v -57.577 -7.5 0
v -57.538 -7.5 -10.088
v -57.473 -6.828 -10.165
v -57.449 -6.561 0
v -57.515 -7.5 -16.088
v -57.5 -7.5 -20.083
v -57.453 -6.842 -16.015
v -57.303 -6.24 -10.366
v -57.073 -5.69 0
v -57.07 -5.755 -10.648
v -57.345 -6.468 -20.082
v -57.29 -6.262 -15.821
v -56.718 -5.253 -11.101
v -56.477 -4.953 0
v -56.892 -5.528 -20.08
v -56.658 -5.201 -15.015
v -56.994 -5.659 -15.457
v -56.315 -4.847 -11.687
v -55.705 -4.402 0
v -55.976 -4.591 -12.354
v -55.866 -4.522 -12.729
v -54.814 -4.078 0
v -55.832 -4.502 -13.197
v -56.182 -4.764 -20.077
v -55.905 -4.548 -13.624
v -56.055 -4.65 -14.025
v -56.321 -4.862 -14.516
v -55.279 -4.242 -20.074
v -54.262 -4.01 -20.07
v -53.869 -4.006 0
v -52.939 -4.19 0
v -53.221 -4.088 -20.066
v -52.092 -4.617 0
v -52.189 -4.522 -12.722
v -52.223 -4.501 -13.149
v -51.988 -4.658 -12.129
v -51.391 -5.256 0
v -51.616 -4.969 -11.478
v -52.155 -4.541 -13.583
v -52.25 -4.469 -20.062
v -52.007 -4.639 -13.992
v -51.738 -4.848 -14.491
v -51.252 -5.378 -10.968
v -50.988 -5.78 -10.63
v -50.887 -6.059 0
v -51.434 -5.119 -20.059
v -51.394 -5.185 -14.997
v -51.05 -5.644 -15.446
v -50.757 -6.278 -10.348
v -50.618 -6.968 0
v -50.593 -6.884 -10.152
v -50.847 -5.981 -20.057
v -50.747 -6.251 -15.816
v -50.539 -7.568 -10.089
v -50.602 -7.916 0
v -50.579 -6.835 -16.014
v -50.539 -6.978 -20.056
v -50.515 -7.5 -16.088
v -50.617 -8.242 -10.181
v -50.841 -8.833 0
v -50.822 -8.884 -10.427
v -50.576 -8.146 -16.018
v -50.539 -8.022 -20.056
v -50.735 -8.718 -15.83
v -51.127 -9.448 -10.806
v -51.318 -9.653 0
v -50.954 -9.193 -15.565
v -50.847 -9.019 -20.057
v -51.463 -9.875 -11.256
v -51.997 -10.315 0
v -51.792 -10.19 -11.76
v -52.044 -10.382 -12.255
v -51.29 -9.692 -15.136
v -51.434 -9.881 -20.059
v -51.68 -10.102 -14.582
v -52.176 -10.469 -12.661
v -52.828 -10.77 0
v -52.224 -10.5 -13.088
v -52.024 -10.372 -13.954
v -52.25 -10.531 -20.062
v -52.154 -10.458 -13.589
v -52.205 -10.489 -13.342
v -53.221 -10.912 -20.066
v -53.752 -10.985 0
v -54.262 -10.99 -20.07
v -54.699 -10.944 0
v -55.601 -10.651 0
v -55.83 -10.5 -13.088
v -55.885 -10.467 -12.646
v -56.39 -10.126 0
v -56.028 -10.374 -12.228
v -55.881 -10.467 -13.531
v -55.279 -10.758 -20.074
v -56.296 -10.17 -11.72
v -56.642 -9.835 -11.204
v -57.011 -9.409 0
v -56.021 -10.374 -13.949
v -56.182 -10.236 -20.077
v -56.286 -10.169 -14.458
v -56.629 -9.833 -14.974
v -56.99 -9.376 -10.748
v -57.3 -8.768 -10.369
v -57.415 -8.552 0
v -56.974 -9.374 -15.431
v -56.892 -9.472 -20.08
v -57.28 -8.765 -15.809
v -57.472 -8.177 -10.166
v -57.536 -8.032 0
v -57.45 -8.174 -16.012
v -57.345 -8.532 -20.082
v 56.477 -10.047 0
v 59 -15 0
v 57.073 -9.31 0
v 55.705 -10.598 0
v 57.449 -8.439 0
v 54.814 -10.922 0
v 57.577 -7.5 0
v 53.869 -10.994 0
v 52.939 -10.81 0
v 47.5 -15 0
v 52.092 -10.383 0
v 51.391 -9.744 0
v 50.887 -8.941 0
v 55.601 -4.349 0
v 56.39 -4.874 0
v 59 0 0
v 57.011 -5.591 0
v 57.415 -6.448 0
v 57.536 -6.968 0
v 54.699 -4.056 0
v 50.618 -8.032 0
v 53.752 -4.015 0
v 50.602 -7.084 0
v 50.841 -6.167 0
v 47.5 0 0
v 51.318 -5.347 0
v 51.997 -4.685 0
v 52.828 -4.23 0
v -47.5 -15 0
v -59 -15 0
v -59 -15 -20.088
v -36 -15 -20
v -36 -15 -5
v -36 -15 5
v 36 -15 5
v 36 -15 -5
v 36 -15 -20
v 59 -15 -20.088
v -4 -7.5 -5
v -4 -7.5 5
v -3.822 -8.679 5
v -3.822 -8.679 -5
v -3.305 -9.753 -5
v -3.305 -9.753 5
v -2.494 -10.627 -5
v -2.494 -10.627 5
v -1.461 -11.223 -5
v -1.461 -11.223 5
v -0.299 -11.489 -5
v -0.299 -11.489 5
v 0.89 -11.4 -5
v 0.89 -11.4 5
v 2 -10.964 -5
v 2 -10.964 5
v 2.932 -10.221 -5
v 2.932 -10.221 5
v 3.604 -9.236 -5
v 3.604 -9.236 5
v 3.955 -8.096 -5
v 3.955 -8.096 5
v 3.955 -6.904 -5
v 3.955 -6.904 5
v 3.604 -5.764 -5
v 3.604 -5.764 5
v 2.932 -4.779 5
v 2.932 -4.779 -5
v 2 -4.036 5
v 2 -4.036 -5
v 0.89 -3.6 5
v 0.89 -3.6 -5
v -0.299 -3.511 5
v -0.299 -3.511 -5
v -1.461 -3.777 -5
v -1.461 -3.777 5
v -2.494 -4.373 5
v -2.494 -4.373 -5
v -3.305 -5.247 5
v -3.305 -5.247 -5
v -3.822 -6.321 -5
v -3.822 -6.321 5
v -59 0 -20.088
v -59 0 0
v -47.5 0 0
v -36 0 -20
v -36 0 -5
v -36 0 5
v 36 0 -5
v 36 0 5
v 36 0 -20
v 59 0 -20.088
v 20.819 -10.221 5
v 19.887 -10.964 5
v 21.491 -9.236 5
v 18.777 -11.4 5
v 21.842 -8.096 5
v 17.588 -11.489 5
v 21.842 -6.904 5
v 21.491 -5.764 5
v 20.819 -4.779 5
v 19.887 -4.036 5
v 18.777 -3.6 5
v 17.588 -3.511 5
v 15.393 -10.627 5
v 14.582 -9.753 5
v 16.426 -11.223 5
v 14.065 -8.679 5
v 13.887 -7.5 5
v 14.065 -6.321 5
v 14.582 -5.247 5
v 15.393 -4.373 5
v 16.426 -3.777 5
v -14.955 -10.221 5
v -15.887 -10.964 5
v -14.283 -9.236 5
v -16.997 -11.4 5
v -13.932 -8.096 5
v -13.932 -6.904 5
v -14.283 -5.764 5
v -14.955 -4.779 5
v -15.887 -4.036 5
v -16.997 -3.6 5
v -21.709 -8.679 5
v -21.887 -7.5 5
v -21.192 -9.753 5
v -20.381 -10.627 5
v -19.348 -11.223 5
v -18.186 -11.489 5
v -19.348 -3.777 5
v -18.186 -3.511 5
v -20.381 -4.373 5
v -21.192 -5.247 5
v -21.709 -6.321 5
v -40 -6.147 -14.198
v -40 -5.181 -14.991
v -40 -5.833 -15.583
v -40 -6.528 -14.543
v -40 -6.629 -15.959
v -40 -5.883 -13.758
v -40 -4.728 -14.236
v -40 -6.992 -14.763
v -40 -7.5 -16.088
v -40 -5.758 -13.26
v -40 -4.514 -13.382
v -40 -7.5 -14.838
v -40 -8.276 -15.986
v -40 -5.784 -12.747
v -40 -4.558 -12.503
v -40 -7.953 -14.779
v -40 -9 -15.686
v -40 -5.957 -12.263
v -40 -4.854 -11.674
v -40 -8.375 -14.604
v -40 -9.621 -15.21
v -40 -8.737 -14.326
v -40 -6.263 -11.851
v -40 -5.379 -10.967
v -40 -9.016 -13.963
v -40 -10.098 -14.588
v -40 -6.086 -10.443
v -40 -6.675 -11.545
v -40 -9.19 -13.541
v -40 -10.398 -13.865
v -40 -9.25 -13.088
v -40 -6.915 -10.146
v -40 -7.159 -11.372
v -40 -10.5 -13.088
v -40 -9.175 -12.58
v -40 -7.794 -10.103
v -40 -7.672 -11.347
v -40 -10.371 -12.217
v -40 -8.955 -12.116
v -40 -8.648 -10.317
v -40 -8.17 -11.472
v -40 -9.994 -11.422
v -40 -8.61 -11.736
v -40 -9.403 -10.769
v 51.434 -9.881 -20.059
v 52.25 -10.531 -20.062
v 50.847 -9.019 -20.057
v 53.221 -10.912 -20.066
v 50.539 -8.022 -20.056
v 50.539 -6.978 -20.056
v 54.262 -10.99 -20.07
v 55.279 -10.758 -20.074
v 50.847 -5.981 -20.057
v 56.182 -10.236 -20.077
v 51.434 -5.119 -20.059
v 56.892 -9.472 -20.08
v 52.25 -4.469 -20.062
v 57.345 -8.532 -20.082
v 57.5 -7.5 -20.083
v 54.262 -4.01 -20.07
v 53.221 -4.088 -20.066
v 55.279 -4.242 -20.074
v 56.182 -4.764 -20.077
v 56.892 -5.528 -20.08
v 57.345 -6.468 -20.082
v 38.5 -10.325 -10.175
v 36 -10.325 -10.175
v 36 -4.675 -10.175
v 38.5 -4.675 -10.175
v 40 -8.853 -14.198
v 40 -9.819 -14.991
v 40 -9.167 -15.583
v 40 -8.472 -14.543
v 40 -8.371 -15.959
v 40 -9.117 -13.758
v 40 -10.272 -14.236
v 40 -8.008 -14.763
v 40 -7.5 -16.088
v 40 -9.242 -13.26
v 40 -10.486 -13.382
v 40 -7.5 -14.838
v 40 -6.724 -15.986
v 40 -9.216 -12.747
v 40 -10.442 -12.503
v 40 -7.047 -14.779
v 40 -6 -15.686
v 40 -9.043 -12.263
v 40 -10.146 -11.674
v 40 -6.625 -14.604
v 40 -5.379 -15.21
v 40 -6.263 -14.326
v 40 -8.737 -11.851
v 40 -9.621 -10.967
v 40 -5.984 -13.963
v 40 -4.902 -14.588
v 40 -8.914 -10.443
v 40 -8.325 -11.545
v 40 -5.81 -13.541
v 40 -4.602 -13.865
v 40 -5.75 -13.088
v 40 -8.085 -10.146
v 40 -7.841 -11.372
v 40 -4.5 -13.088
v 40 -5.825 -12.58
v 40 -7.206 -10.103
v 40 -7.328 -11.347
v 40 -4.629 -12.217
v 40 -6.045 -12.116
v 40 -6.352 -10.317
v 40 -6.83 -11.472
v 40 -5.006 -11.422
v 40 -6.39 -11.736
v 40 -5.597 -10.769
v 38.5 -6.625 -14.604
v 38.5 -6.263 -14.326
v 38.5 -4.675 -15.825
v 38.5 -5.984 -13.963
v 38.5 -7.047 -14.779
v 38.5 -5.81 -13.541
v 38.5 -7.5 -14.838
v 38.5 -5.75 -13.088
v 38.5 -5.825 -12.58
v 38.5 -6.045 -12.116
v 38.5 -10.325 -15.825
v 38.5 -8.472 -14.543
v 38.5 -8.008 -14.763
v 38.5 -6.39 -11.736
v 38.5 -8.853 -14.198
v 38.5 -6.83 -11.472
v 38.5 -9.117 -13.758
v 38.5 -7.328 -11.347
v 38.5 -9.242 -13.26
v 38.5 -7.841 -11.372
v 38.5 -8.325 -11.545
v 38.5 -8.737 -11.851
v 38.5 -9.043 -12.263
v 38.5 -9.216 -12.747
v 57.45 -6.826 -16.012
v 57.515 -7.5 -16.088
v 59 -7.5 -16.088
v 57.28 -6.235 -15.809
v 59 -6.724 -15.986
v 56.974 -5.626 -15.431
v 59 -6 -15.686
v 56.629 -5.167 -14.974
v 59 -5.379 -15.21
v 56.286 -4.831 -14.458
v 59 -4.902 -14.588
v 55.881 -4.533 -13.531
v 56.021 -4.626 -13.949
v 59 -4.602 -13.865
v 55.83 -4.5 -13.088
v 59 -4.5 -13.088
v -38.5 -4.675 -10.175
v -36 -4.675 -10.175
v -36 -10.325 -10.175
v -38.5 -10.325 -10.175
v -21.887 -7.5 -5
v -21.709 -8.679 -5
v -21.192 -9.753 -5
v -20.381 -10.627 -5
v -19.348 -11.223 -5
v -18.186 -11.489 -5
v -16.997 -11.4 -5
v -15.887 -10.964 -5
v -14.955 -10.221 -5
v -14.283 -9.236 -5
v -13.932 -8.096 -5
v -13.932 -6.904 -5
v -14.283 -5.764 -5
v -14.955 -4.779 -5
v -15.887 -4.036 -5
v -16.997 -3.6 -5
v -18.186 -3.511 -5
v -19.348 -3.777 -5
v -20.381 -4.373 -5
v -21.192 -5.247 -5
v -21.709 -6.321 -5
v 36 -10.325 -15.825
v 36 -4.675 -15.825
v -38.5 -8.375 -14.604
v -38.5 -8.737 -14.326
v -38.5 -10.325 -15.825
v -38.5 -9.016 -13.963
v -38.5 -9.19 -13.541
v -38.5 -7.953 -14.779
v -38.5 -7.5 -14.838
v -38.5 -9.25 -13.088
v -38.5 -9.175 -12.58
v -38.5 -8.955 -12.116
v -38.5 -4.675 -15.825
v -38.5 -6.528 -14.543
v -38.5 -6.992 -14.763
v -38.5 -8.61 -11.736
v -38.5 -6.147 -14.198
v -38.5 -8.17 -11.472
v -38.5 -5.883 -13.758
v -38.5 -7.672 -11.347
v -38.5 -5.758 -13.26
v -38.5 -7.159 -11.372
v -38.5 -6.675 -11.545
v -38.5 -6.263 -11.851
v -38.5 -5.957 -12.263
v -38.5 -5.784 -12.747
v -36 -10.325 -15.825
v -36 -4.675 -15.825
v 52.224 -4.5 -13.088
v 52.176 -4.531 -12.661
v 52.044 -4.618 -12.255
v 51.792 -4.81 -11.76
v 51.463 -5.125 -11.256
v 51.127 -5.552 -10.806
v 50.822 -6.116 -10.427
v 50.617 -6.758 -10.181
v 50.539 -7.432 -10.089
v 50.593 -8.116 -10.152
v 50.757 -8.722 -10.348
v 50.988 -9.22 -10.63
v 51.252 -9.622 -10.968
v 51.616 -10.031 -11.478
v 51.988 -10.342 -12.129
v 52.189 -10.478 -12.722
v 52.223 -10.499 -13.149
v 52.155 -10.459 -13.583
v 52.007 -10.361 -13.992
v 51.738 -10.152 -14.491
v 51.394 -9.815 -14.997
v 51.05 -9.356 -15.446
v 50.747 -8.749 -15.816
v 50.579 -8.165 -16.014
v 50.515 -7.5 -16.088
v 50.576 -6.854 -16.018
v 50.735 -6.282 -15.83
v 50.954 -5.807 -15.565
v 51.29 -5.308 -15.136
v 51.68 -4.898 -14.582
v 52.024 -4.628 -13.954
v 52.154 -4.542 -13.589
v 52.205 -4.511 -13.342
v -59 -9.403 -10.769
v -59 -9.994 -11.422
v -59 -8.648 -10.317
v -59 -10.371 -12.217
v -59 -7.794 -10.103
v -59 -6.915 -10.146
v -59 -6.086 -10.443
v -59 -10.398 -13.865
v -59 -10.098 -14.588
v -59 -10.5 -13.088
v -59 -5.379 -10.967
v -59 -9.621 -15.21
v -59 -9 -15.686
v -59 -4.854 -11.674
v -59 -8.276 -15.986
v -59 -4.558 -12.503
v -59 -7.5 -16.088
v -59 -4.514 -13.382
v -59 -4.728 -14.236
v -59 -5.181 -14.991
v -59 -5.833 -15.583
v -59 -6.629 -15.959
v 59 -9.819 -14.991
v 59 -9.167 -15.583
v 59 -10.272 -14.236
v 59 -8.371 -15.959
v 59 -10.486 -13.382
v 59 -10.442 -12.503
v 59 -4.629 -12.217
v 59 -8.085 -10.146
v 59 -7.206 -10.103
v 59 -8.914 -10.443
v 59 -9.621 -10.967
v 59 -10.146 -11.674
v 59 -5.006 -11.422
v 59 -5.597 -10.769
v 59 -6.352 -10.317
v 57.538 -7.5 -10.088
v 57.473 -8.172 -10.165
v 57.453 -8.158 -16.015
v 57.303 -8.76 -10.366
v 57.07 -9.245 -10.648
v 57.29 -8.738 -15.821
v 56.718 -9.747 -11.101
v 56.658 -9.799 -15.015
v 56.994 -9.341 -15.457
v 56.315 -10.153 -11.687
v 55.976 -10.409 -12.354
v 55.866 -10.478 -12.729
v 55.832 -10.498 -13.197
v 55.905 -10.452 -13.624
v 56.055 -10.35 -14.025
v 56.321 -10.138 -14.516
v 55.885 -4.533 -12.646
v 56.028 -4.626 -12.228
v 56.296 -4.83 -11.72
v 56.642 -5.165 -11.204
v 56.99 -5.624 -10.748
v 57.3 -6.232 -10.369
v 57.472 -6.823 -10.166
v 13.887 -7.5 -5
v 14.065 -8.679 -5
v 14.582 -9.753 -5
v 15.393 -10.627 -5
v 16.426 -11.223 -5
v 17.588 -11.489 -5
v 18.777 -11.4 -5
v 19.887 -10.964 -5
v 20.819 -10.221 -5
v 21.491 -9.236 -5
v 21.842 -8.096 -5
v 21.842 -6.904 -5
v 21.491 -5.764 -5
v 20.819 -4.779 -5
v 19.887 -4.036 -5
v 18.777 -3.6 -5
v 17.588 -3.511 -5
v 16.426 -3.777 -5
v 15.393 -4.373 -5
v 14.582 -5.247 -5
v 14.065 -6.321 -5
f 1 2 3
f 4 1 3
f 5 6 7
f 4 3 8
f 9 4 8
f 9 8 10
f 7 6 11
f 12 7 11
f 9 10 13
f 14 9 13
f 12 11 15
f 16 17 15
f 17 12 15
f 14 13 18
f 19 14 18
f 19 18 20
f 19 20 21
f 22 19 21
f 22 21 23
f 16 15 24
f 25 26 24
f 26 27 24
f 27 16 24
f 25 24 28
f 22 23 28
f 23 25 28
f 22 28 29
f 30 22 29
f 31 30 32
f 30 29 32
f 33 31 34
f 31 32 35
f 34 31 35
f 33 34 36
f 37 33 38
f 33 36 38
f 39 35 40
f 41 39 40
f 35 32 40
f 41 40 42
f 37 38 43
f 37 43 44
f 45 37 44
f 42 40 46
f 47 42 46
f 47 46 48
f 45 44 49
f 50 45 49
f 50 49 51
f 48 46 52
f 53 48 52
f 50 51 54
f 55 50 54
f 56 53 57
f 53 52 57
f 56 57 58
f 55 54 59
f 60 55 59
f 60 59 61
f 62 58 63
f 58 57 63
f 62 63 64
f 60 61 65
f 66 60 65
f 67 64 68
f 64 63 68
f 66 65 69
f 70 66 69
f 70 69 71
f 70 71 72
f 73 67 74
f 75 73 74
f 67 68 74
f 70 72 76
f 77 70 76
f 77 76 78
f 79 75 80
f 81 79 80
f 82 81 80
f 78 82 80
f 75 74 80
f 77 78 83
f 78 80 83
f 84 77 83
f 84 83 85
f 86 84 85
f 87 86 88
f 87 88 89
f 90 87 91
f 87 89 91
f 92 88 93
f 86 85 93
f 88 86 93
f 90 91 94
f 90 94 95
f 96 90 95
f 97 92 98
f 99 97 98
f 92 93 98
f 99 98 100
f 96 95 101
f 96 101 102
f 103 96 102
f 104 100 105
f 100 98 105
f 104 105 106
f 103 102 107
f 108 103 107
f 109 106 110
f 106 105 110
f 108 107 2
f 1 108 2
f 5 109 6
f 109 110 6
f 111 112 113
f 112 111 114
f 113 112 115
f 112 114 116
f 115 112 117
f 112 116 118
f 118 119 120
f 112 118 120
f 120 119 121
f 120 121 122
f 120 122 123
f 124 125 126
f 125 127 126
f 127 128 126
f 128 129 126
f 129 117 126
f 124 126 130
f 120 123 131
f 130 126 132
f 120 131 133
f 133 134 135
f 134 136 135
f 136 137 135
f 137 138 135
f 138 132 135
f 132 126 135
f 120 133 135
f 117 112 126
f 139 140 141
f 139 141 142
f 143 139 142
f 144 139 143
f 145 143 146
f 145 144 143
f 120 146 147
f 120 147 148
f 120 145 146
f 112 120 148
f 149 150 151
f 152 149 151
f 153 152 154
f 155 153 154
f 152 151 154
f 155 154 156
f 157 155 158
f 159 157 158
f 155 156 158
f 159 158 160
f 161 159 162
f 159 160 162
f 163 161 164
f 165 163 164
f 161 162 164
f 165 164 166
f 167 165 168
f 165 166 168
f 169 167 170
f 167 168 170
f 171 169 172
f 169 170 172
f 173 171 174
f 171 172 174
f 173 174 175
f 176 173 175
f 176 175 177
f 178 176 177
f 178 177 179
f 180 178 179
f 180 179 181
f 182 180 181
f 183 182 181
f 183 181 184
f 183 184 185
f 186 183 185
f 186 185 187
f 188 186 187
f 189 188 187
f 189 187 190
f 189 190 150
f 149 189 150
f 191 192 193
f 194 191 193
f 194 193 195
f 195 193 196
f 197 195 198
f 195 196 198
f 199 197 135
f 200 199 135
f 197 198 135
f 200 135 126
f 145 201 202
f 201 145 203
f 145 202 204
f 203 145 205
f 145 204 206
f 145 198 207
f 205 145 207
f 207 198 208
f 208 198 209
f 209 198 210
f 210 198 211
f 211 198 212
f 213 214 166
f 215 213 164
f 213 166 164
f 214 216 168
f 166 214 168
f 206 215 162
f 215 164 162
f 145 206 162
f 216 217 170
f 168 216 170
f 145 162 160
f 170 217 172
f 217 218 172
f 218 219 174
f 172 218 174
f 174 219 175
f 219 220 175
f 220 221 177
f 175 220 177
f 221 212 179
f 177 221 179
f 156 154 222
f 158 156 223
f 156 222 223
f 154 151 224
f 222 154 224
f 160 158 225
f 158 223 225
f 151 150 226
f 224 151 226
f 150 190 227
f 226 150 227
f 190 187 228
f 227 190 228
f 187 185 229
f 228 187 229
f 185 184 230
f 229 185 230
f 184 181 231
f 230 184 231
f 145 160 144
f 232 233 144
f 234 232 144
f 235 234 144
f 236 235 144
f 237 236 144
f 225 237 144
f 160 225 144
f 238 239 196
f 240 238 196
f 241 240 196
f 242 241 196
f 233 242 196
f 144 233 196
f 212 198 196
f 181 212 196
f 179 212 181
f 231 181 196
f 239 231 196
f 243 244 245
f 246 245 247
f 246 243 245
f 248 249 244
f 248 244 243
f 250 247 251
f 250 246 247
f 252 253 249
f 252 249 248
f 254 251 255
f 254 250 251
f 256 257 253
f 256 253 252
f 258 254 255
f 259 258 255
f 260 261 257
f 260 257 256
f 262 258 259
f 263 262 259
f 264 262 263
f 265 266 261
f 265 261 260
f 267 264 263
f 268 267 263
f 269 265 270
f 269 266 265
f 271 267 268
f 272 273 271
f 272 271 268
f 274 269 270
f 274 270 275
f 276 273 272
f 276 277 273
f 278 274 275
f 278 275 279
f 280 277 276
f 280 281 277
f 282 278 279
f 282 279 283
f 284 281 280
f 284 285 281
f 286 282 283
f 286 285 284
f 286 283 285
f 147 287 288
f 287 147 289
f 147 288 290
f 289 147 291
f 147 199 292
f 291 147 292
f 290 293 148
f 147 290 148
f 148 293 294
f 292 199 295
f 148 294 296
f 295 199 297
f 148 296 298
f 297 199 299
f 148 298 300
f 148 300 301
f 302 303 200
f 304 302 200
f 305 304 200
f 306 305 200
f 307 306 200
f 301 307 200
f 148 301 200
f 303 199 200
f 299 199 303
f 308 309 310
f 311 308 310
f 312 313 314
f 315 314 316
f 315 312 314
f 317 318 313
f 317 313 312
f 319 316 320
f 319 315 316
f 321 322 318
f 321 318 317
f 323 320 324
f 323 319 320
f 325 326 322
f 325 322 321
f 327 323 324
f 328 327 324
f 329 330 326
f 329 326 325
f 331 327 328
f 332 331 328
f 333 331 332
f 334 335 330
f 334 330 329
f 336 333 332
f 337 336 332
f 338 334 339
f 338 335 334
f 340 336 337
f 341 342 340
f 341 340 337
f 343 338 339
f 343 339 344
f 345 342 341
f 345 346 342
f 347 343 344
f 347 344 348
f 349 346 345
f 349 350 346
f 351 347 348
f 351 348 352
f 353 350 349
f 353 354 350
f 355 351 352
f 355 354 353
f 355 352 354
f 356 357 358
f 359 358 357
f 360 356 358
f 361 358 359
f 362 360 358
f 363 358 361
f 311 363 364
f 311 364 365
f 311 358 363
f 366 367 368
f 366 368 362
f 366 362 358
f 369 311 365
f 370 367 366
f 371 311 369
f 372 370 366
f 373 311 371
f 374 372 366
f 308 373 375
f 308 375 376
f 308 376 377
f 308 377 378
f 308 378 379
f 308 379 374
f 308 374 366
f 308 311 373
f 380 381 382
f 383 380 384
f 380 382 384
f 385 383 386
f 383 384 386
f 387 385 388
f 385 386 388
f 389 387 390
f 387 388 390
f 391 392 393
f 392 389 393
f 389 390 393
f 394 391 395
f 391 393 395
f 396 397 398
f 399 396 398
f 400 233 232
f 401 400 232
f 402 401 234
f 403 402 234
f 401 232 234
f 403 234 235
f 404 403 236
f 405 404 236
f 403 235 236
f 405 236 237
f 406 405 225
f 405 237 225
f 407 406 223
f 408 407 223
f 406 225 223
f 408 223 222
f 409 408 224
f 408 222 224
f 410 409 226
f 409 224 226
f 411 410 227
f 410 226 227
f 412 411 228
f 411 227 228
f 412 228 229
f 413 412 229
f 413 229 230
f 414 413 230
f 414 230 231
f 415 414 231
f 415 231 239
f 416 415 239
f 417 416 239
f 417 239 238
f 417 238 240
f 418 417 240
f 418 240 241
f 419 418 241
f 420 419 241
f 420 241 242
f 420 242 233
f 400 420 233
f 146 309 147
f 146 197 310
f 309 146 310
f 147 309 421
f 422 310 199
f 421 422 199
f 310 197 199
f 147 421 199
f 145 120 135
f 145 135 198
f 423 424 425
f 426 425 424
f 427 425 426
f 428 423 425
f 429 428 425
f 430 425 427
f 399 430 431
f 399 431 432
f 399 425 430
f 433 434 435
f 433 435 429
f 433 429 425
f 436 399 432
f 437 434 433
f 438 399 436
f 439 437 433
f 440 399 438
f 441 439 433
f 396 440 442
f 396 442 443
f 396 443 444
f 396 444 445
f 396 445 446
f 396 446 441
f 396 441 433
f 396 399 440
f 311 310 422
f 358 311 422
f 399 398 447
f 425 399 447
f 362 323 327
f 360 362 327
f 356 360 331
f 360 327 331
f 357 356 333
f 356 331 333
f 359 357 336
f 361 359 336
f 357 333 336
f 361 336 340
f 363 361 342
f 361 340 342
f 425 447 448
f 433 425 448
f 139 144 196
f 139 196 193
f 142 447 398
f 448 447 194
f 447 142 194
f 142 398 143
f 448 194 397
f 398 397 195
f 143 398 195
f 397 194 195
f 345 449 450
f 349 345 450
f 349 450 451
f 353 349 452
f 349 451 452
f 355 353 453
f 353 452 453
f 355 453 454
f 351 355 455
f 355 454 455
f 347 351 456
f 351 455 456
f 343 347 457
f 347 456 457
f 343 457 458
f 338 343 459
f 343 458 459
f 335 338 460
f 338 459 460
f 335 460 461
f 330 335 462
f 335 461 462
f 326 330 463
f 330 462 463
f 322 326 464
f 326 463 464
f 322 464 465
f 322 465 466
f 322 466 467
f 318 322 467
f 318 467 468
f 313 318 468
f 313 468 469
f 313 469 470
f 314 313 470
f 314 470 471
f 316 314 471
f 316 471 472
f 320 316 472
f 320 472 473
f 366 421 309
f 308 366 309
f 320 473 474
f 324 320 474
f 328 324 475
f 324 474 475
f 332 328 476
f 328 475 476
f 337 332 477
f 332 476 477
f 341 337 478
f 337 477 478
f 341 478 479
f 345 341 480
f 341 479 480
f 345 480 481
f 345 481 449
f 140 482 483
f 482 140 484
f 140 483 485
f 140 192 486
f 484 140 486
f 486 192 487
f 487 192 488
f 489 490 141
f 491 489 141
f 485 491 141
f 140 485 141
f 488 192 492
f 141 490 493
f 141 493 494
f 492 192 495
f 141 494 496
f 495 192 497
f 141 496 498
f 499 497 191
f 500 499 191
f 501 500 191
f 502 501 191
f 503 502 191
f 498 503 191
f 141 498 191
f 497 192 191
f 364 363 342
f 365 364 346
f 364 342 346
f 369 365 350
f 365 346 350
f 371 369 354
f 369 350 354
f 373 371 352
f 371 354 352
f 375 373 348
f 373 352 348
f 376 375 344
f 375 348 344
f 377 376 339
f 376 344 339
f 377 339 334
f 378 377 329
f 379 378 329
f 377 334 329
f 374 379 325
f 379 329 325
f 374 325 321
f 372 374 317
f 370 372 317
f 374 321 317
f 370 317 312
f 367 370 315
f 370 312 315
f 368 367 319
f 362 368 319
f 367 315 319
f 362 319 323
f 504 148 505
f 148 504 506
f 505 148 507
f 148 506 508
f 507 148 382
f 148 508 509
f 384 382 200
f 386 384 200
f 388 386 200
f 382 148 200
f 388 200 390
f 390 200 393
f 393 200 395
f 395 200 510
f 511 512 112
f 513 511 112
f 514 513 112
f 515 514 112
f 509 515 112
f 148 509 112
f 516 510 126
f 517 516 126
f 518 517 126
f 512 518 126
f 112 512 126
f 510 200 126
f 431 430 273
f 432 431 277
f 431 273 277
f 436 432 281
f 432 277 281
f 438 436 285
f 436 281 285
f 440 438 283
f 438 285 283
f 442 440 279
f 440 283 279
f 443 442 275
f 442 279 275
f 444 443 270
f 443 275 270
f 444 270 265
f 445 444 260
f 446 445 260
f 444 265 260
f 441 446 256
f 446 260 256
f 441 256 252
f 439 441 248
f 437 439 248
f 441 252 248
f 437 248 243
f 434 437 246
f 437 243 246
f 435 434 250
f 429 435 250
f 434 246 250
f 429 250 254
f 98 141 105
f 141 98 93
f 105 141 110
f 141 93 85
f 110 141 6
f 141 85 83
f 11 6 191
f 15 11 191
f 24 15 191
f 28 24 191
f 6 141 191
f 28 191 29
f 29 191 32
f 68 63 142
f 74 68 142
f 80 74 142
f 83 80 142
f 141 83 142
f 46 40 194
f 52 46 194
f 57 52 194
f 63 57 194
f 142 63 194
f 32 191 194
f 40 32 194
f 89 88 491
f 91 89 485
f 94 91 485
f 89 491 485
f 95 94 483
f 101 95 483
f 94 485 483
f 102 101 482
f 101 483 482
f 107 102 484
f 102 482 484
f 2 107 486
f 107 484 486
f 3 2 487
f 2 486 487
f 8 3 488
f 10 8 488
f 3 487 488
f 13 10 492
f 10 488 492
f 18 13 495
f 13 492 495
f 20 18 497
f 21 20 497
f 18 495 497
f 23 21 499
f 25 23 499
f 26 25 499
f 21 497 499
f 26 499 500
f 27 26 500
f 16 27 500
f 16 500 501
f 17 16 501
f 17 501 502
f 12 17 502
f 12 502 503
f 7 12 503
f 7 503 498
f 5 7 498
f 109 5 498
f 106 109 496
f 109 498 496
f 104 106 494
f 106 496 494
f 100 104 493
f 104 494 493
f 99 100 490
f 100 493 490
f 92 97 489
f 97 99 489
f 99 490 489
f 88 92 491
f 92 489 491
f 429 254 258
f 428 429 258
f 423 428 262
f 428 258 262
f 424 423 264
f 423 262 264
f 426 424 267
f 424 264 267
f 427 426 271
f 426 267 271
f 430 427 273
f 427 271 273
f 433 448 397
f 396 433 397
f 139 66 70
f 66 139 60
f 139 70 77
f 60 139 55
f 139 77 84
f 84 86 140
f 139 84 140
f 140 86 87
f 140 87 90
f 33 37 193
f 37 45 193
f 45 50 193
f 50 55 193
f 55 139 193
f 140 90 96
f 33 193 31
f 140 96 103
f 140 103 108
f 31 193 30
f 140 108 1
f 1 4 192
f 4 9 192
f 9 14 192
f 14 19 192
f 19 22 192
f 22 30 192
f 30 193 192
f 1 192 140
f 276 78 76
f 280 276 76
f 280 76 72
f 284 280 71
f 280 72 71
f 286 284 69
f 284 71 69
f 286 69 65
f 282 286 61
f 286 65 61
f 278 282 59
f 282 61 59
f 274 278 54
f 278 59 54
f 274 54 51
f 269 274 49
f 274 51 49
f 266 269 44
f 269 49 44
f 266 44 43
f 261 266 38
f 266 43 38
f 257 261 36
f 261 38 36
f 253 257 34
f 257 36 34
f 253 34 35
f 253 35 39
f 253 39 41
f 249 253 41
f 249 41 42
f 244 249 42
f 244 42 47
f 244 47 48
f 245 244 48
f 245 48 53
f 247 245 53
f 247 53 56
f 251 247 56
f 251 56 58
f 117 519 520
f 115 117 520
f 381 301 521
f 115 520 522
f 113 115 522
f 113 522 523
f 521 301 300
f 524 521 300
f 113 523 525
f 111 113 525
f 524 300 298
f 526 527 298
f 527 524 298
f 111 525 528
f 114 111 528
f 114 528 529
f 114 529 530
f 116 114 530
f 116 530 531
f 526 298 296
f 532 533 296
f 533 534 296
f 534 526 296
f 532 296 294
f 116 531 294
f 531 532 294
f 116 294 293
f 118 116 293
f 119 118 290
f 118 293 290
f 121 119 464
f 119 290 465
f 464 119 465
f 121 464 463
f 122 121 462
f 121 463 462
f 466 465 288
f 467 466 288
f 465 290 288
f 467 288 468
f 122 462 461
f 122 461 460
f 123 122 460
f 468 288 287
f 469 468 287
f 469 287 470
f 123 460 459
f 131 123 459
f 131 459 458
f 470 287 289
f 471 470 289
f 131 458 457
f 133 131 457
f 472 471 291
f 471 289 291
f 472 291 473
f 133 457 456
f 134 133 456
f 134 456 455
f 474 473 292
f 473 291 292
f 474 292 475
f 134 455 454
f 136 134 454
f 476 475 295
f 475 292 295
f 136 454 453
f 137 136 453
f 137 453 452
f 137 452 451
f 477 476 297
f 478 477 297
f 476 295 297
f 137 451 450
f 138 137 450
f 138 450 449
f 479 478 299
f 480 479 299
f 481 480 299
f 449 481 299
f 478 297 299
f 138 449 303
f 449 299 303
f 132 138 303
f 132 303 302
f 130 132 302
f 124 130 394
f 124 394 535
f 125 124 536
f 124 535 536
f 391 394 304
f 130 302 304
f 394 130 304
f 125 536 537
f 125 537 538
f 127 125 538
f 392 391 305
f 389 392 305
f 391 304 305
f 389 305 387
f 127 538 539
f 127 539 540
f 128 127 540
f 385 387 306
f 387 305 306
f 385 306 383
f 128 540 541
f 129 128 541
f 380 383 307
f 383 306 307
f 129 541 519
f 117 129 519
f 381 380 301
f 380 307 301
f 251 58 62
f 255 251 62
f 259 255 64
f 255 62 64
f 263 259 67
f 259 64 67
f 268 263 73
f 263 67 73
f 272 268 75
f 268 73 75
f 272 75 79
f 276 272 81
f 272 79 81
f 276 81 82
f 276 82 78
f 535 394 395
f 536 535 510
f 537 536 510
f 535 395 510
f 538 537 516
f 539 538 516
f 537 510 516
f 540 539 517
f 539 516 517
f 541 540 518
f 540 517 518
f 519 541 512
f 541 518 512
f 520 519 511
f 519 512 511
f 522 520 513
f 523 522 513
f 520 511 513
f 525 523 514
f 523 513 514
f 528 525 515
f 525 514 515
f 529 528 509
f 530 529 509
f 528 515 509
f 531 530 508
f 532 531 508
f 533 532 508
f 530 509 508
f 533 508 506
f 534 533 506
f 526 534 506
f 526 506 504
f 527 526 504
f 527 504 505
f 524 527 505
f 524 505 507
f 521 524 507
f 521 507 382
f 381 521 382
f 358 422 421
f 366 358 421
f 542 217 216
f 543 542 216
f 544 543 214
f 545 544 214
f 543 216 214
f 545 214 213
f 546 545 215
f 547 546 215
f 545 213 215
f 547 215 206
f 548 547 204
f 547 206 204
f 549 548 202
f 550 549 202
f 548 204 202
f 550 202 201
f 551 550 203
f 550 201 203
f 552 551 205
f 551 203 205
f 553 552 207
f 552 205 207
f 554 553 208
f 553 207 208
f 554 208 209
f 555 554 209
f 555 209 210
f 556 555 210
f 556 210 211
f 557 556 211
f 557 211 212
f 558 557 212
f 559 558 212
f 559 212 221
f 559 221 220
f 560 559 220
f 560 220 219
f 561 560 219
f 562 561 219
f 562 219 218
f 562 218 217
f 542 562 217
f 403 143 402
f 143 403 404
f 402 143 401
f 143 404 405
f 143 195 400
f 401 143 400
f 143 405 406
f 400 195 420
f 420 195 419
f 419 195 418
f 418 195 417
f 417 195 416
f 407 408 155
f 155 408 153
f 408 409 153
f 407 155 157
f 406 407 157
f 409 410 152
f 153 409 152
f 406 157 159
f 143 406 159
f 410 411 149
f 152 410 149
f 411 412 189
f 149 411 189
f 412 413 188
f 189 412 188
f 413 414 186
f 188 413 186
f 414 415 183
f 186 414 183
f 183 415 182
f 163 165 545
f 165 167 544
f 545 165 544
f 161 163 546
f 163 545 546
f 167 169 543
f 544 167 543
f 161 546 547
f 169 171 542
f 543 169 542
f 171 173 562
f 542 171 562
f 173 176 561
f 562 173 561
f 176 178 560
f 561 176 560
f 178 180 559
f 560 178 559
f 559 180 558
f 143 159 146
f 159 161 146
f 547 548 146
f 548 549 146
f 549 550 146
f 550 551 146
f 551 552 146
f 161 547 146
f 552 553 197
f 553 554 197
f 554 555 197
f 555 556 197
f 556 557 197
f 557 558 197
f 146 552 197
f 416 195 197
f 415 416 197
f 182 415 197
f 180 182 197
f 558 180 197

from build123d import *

# Parameters (mm, degrees)
F1_DEPTH  = 15
F5_DEPTH  = 23
F6_DEPTH  = 19
F2_R      = 3.5
F7_DEPTH  = 25
F8_DEPTH  = 2.5
F12_DEPTH = 19
F13_DEPTH = 23
F14_DEPTH = 2.5
F15_DEPTH = 25
F17_DEPTH = 25


with BuildPart() as f1:
    # F0 (on Front) → F1 (new body)
    with BuildSketch(Plane.XZ):
        Polygon((47.5, 0), (36, 5), (36, 2.5), (36, 0), align=None)
        Polygon((-36, -20), (-36, -5), (-59, -5), (-59, -20.0883084536), align=None)
        Polygon((-36, -5), (-36, 0), (-47.5, 0), (-59, 0), (-59, -5), align=None)
        Polygon((-36, 0), (-36, 5), (-47.5, 0), align=None)
        Polygon((36, 5), (-36, 5), (-36, 0), (-36, -5), (36, -5), (36, 0), (36, 2.5), align=None)
        Polygon((59, 0), (47.5, 0), (36, 0), (36, -5), (36, -20), (59, -20.0883084536), (59, -5), align=None)
    extrude(amount=F1_DEPTH)

    # F3 (on face) → F5 (cut)
    with BuildSketch(Plane.YZ.offset(59)):
        with BuildLine():
            ThreePointArc((-5.75, -13.0883084536), (-8.7374368671, -11.8508715865), (-7.5, -14.8383084536))
            ThreePointArc((-7.5, -14.8383084536), (-6.2625631329, -14.3257453206), (-5.75, -13.0883084536))
        make_face()
    extrude(amount=-F5_DEPTH, mode=Mode.SUBTRACT)

    # F3 (on face) → F6 (cut)
    with BuildSketch(Plane.YZ.offset(59)):
        with BuildLine():
            ThreePointArc((-4.5, -13.0883084536), (-9.6213203436, -10.96698811), (-7.5, -16.0883084536))
            ThreePointArc((-7.5, -16.0883084536), (-5.3786796564, -15.2096287971), (-4.5, -13.0883084536))
        make_face()
        with BuildLine():
            ThreePointArc((-5.75, -13.0883084536), (-6.2625631329, -14.3257453206), (-7.5, -14.8383084536))
            ThreePointArc((-7.5, -14.8383084536), (-8.7374368671, -11.8508715865), (-5.75, -13.0883084536))
        make_face(mode=Mode.SUBTRACT)
    extrude(amount=-F6_DEPTH, mode=Mode.SUBTRACT)

    # F2 (on face) → F7 (cut)
    with BuildSketch(Plane(origin=(-0.0762581326, 0, -19.8614852797), x_dir=(0.9999926292, 0, -0.0038394697), z_dir=(-0.0038394697, 0, -0.9999926292))):
        with Locations((54.0766935746, 7.5)):
            Circle(F2_R)
    extrude(amount=-F7_DEPTH, mode=Mode.SUBTRACT)

    # F4 (on face) → F8 (cut)
    with BuildSketch(Plane(origin=(36, 0, 0), x_dir=(0, -1, 0), z_dir=(-1, 0, 0))):
        Polygon((4.675, -15.825), (7.5, -15.825), (10.325, -15.825), (10.325, -10.175), (4.675, -10.175), align=None)
    extrude(amount=-F8_DEPTH, mode=Mode.SUBTRACT)

    # F9 (on face) → F12 (cut)
    with BuildSketch(Plane(origin=(-59, 0, 0), x_dir=(0, -1, 0), z_dir=(-1, 0, 0))):
        with BuildLine():
            ThreePointArc((10.5, -13.0883084536), (5.3786796564, -10.96698811), (7.5, -16.0883084536))
            ThreePointArc((7.5, -16.0883084536), (9.6213203436, -15.2096287971), (10.5, -13.0883084536))
        make_face()
        with BuildLine():
            ThreePointArc((9.25, -13.0883084536), (8.7374368671, -14.3257453206), (7.5, -14.8383084536))
            ThreePointArc((7.5, -14.8383084536), (6.2625631329, -11.8508715865), (9.25, -13.0883084536))
        make_face(mode=Mode.SUBTRACT)
    extrude(amount=-F12_DEPTH, mode=Mode.SUBTRACT)

    # F9 (on face) → F13 (cut)
    with BuildSketch(Plane(origin=(-59, 0, 0), x_dir=(0, -1, 0), z_dir=(-1, 0, 0))):
        with BuildLine():
            ThreePointArc((9.25, -13.0883084536), (6.2625631329, -11.8508715865), (7.5, -14.8383084536))
            ThreePointArc((7.5, -14.8383084536), (8.7374368671, -14.3257453206), (9.25, -13.0883084536))
        make_face()
    extrude(amount=-F13_DEPTH, mode=Mode.SUBTRACT)

    # F10 (on face) → F14 (cut)
    with BuildSketch(Plane.YZ.offset(-36)):
        Polygon((-10.325, -15.825), (-7.5, -15.825), (-4.675, -15.825), (-4.675, -10.175), (-10.325, -10.175), align=None)
    extrude(amount=-F14_DEPTH, mode=Mode.SUBTRACT)

    # F11 (on face) → F15 (cut)
    with BuildSketch(Plane(origin=(0.0762581326, 0, -19.8614852797), x_dir=(0.9999926292, 0, 0.0038394697), z_dir=(0.0038394697, 0, -0.9999926292))):
        with BuildLine():
            ThreePointArc((-50.5766935746, 7.5), (-54.0766935746, 11), (-57.5766935746, 7.5))
            ThreePointArc((-57.5766935746, 7.5), (-54.0766935746, 4), (-50.5766935746, 7.5))
        make_face()
    extrude(amount=-F15_DEPTH, mode=Mode.SUBTRACT)

    # F16 (on face) → F17 (cut)
    with BuildSketch(Plane.XY.offset(5)):
        with BuildLine():
            ThreePointArc((-13.8871266544, -7.5), (-17.8871266544, -3.5), (-21.8871266544, -7.5))
            Line((-21.8871266544, -7.5), (-13.8871266544, -7.5))
        make_face()
        with BuildLine():
            ThreePointArc((21.8871266544, -7.5), (17.8871266544, -3.5), (13.8871266544, -7.5))
            Line((13.8871266544, -7.5), (21.8871266544, -7.5))
        make_face()
        with BuildLine():
            Line((21.8871266544, -7.5), (13.8871266544, -7.5))
            ThreePointArc((13.8871266544, -7.5), (17.8871266544, -11.5), (21.8871266544, -7.5))
        make_face()
        with BuildLine():
            ThreePointArc((4, -7.5), (0, -3.5), (-4, -7.5))
            Line((-4, -7.5), (4, -7.5))
        make_face()
        with BuildLine():
            Line((4, -7.5), (-4, -7.5))
            ThreePointArc((-4, -7.5), (0, -11.5), (4, -7.5))
        make_face()
        with BuildLine():
            Line((-13.8871266544, -7.5), (-21.8871266544, -7.5))
            ThreePointArc((-21.8871266544, -7.5), (-17.8871266544, -11.5), (-13.8871266544, -7.5))
        make_face()
    extrude(amount=-F17_DEPTH, mode=Mode.SUBTRACT)


solid = f1.part
